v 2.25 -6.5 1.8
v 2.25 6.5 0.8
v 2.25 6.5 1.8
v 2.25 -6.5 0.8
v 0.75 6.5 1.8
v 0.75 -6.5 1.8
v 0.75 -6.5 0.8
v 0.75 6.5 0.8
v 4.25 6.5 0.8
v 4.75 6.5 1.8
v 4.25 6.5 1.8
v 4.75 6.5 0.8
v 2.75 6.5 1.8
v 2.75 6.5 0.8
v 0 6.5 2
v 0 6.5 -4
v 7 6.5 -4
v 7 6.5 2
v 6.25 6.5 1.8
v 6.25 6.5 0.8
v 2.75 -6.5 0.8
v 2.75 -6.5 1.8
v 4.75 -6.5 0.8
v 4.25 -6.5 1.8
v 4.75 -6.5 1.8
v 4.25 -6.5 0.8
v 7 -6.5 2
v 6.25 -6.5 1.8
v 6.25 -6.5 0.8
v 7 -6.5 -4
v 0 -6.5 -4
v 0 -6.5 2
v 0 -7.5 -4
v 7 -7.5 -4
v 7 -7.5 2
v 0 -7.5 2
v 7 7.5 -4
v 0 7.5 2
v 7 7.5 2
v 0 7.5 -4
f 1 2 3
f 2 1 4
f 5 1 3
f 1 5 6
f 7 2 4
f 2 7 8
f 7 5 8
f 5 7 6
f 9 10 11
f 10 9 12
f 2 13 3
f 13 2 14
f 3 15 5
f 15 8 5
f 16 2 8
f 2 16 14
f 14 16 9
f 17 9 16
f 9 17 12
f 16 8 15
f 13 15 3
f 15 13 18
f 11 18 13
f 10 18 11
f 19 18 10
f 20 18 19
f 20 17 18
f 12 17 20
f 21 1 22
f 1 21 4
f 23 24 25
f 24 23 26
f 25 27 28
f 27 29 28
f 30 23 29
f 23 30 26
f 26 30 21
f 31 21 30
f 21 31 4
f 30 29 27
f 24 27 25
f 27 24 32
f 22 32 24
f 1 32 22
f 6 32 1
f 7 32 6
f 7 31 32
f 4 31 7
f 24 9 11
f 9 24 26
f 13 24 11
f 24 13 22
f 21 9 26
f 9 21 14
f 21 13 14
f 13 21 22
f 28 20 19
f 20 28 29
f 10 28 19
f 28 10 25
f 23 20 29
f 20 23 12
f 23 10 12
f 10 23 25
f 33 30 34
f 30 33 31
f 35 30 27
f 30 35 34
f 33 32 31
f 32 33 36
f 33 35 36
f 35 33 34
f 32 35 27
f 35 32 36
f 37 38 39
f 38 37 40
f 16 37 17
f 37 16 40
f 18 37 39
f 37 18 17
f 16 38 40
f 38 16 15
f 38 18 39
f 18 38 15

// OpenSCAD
// #linear_extrude(7, scale = 1, center = true)

module Bench_02(){

    color("gray")
    translate([0,-7,0])
    rotate([90,0,0])
    linear_extrude(1, scale = 1, center = true)
    polygon(points=[[0,-4],[7,-4],[7,2],[0,2]]);
         
         
    translate([0,7,0])    
    color("gray")

    rotate([90,0,0])
    linear_extrude(1, scale = 1, center = true)
    polygon(points=[[0,-4],[7,-4],[7,2],[0,2]]);   

    color("#c69874"){
    translate([1.5,0,1.3]) 
    cube([1.5,13,1], center = true);

    translate([3.5,0,1.3]) 
    cube([1.5,13,1], center = true);

    translate([5.5,0,1.3]) 
    cube([1.5,13,1], center = true);
    }

}

Bench_02();
